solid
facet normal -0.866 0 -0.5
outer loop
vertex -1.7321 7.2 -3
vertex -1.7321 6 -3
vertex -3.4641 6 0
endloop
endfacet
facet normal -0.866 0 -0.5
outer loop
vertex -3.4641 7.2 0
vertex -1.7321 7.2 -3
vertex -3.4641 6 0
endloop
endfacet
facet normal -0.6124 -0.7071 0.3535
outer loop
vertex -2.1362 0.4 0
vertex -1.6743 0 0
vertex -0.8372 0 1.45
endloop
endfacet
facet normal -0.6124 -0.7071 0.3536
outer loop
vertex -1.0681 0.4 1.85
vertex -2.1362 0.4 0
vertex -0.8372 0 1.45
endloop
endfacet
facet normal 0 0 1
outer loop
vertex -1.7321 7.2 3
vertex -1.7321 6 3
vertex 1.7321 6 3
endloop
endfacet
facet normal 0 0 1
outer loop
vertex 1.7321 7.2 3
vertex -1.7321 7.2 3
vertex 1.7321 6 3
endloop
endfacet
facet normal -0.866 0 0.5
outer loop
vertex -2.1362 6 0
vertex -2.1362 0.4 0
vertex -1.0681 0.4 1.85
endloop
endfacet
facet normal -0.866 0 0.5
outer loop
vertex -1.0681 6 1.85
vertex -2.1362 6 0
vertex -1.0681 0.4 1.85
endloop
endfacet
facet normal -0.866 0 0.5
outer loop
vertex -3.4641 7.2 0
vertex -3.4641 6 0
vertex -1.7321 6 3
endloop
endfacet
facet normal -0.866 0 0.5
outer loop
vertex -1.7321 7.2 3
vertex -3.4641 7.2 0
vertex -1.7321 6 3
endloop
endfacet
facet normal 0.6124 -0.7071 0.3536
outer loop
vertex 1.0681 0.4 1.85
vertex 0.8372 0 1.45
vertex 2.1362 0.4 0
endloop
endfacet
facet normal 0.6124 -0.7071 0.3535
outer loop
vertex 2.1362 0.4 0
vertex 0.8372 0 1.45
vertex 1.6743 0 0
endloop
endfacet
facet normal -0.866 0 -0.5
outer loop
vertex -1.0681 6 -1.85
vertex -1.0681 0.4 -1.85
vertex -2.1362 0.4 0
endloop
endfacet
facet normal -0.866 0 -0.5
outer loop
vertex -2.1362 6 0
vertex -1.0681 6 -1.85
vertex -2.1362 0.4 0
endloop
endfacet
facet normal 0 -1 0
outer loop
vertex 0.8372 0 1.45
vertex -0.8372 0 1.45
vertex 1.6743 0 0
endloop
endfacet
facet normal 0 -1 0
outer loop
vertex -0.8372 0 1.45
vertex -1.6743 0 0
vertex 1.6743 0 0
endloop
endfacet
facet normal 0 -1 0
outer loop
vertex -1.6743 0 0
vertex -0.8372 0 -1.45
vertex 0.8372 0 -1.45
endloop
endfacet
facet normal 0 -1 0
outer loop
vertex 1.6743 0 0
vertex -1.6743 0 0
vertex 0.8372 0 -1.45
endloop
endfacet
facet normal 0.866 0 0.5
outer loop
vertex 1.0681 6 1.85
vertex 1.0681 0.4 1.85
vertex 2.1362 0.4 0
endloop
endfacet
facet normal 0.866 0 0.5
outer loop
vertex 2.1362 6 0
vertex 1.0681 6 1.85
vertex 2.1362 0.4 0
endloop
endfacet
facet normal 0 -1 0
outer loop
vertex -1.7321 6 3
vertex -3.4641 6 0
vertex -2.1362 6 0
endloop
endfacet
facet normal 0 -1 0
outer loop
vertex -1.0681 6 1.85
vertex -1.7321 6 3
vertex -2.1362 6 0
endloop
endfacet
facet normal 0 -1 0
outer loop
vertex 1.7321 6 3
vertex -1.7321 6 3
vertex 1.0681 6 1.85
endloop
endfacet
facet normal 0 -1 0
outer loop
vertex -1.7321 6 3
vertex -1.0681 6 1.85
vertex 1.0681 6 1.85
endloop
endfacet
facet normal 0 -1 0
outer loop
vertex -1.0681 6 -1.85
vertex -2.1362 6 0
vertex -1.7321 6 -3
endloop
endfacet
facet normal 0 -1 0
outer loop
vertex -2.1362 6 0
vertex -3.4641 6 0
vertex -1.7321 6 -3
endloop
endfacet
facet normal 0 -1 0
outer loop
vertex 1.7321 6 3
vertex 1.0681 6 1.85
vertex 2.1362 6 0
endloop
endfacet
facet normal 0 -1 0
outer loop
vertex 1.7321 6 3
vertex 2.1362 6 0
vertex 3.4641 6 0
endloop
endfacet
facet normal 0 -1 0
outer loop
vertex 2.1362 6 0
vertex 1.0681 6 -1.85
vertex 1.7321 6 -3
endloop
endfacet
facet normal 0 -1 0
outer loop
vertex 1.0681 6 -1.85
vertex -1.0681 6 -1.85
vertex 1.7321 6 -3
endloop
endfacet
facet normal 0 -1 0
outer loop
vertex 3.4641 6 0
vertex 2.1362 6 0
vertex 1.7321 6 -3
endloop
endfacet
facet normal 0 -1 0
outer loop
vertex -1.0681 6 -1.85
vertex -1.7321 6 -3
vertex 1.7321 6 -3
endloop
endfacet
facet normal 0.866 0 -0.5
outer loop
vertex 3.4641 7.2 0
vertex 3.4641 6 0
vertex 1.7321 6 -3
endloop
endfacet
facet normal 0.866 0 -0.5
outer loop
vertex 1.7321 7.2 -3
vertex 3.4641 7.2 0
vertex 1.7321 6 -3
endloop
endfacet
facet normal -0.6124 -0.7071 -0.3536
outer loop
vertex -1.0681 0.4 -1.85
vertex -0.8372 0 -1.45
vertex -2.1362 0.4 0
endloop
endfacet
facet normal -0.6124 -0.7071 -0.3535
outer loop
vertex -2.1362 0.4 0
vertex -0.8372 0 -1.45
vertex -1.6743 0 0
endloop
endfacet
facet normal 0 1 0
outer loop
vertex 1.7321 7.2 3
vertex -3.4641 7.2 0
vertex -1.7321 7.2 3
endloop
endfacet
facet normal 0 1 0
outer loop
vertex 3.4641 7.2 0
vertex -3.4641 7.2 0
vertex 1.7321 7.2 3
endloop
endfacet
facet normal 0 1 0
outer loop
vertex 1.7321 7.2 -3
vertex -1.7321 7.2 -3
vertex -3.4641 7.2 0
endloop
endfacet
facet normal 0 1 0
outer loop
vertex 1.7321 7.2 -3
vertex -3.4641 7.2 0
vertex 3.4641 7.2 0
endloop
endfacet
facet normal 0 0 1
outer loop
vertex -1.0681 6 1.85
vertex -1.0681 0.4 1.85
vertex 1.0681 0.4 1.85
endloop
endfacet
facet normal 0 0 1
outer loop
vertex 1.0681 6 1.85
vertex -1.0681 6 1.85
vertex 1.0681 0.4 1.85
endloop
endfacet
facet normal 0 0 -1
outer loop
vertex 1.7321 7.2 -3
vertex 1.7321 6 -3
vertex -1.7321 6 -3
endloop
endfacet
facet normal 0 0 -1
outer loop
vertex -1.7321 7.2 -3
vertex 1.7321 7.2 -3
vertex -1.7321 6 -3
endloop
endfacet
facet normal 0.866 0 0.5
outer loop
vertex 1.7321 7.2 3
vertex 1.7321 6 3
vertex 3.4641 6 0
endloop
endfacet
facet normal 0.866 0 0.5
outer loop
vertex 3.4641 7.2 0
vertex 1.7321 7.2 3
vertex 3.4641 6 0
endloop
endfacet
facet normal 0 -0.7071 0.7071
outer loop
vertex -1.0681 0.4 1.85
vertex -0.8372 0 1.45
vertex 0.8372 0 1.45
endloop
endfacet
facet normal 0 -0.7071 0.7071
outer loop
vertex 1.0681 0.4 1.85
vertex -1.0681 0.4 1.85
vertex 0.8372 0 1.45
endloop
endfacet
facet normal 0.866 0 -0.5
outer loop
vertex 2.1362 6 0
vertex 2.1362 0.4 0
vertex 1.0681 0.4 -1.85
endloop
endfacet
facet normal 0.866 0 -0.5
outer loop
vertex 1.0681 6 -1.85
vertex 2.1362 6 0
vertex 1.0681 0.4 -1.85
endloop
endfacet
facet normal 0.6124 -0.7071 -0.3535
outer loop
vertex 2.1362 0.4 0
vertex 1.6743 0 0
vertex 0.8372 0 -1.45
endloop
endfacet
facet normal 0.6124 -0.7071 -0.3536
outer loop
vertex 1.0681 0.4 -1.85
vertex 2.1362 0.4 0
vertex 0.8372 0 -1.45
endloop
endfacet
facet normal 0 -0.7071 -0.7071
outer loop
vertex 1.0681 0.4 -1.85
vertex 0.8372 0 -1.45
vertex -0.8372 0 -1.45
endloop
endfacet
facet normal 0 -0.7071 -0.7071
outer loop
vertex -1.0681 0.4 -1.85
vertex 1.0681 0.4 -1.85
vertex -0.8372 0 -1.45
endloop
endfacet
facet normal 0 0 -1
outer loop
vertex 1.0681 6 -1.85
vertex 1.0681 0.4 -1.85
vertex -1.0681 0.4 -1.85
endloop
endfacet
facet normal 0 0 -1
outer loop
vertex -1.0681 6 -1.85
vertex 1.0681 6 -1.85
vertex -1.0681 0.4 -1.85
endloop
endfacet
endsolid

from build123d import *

# Parameters (mm, degrees)
BOSS_EXTRUDE1_DEPTH = 6
BOSS_EXTRUDE2_DEPTH = 1.2
CHAMFER1_SIZE       = 0.4


with BuildPart() as part:
    # Sketch1 → Boss-Extrude1 (new body)
    with BuildSketch(Plane(origin=(0, 0, 0), x_dir=(1, 0, 0), z_dir=(0, 1, 0))):
        Polygon((2.136195996, 0), (1.068097998, 1.85), (-1.068097998, 1.85), (-2.136195996, 0), (-1.068097998, -1.85), (1.068097998, -1.85), align=None)
    extrude(amount=BOSS_EXTRUDE1_DEPTH)

    # Sketch2 → Boss-Extrude2 (add)
    with BuildSketch(Plane(origin=(0, 6, 0), x_dir=(1, 0, 0), z_dir=(0, 1, 0))):
        Polygon((3.464101615, 0), (1.732050808, 3), (-1.732050808, 3), (-3.464101615, 0), (-1.732050808, -3), (1.732050808, -3), align=None)
    extrude(amount=BOSS_EXTRUDE2_DEPTH)

    # Chamfer1
    chamfer1_edges = [part.edges().sort_by_distance(p)[0] for p in [
        (0, 0, 1.85),
        (-1.602146997, 0, 0.925),
        (-1.602146997, 0, -0.925),
        (0, 0, -1.85),
        (1.602146997, 0, -0.925),
        (1.602146997, 0, 0.925),
    ]]
    chamfer(chamfer1_edges, length=CHAMFER1_SIZE)


solid = part.part
